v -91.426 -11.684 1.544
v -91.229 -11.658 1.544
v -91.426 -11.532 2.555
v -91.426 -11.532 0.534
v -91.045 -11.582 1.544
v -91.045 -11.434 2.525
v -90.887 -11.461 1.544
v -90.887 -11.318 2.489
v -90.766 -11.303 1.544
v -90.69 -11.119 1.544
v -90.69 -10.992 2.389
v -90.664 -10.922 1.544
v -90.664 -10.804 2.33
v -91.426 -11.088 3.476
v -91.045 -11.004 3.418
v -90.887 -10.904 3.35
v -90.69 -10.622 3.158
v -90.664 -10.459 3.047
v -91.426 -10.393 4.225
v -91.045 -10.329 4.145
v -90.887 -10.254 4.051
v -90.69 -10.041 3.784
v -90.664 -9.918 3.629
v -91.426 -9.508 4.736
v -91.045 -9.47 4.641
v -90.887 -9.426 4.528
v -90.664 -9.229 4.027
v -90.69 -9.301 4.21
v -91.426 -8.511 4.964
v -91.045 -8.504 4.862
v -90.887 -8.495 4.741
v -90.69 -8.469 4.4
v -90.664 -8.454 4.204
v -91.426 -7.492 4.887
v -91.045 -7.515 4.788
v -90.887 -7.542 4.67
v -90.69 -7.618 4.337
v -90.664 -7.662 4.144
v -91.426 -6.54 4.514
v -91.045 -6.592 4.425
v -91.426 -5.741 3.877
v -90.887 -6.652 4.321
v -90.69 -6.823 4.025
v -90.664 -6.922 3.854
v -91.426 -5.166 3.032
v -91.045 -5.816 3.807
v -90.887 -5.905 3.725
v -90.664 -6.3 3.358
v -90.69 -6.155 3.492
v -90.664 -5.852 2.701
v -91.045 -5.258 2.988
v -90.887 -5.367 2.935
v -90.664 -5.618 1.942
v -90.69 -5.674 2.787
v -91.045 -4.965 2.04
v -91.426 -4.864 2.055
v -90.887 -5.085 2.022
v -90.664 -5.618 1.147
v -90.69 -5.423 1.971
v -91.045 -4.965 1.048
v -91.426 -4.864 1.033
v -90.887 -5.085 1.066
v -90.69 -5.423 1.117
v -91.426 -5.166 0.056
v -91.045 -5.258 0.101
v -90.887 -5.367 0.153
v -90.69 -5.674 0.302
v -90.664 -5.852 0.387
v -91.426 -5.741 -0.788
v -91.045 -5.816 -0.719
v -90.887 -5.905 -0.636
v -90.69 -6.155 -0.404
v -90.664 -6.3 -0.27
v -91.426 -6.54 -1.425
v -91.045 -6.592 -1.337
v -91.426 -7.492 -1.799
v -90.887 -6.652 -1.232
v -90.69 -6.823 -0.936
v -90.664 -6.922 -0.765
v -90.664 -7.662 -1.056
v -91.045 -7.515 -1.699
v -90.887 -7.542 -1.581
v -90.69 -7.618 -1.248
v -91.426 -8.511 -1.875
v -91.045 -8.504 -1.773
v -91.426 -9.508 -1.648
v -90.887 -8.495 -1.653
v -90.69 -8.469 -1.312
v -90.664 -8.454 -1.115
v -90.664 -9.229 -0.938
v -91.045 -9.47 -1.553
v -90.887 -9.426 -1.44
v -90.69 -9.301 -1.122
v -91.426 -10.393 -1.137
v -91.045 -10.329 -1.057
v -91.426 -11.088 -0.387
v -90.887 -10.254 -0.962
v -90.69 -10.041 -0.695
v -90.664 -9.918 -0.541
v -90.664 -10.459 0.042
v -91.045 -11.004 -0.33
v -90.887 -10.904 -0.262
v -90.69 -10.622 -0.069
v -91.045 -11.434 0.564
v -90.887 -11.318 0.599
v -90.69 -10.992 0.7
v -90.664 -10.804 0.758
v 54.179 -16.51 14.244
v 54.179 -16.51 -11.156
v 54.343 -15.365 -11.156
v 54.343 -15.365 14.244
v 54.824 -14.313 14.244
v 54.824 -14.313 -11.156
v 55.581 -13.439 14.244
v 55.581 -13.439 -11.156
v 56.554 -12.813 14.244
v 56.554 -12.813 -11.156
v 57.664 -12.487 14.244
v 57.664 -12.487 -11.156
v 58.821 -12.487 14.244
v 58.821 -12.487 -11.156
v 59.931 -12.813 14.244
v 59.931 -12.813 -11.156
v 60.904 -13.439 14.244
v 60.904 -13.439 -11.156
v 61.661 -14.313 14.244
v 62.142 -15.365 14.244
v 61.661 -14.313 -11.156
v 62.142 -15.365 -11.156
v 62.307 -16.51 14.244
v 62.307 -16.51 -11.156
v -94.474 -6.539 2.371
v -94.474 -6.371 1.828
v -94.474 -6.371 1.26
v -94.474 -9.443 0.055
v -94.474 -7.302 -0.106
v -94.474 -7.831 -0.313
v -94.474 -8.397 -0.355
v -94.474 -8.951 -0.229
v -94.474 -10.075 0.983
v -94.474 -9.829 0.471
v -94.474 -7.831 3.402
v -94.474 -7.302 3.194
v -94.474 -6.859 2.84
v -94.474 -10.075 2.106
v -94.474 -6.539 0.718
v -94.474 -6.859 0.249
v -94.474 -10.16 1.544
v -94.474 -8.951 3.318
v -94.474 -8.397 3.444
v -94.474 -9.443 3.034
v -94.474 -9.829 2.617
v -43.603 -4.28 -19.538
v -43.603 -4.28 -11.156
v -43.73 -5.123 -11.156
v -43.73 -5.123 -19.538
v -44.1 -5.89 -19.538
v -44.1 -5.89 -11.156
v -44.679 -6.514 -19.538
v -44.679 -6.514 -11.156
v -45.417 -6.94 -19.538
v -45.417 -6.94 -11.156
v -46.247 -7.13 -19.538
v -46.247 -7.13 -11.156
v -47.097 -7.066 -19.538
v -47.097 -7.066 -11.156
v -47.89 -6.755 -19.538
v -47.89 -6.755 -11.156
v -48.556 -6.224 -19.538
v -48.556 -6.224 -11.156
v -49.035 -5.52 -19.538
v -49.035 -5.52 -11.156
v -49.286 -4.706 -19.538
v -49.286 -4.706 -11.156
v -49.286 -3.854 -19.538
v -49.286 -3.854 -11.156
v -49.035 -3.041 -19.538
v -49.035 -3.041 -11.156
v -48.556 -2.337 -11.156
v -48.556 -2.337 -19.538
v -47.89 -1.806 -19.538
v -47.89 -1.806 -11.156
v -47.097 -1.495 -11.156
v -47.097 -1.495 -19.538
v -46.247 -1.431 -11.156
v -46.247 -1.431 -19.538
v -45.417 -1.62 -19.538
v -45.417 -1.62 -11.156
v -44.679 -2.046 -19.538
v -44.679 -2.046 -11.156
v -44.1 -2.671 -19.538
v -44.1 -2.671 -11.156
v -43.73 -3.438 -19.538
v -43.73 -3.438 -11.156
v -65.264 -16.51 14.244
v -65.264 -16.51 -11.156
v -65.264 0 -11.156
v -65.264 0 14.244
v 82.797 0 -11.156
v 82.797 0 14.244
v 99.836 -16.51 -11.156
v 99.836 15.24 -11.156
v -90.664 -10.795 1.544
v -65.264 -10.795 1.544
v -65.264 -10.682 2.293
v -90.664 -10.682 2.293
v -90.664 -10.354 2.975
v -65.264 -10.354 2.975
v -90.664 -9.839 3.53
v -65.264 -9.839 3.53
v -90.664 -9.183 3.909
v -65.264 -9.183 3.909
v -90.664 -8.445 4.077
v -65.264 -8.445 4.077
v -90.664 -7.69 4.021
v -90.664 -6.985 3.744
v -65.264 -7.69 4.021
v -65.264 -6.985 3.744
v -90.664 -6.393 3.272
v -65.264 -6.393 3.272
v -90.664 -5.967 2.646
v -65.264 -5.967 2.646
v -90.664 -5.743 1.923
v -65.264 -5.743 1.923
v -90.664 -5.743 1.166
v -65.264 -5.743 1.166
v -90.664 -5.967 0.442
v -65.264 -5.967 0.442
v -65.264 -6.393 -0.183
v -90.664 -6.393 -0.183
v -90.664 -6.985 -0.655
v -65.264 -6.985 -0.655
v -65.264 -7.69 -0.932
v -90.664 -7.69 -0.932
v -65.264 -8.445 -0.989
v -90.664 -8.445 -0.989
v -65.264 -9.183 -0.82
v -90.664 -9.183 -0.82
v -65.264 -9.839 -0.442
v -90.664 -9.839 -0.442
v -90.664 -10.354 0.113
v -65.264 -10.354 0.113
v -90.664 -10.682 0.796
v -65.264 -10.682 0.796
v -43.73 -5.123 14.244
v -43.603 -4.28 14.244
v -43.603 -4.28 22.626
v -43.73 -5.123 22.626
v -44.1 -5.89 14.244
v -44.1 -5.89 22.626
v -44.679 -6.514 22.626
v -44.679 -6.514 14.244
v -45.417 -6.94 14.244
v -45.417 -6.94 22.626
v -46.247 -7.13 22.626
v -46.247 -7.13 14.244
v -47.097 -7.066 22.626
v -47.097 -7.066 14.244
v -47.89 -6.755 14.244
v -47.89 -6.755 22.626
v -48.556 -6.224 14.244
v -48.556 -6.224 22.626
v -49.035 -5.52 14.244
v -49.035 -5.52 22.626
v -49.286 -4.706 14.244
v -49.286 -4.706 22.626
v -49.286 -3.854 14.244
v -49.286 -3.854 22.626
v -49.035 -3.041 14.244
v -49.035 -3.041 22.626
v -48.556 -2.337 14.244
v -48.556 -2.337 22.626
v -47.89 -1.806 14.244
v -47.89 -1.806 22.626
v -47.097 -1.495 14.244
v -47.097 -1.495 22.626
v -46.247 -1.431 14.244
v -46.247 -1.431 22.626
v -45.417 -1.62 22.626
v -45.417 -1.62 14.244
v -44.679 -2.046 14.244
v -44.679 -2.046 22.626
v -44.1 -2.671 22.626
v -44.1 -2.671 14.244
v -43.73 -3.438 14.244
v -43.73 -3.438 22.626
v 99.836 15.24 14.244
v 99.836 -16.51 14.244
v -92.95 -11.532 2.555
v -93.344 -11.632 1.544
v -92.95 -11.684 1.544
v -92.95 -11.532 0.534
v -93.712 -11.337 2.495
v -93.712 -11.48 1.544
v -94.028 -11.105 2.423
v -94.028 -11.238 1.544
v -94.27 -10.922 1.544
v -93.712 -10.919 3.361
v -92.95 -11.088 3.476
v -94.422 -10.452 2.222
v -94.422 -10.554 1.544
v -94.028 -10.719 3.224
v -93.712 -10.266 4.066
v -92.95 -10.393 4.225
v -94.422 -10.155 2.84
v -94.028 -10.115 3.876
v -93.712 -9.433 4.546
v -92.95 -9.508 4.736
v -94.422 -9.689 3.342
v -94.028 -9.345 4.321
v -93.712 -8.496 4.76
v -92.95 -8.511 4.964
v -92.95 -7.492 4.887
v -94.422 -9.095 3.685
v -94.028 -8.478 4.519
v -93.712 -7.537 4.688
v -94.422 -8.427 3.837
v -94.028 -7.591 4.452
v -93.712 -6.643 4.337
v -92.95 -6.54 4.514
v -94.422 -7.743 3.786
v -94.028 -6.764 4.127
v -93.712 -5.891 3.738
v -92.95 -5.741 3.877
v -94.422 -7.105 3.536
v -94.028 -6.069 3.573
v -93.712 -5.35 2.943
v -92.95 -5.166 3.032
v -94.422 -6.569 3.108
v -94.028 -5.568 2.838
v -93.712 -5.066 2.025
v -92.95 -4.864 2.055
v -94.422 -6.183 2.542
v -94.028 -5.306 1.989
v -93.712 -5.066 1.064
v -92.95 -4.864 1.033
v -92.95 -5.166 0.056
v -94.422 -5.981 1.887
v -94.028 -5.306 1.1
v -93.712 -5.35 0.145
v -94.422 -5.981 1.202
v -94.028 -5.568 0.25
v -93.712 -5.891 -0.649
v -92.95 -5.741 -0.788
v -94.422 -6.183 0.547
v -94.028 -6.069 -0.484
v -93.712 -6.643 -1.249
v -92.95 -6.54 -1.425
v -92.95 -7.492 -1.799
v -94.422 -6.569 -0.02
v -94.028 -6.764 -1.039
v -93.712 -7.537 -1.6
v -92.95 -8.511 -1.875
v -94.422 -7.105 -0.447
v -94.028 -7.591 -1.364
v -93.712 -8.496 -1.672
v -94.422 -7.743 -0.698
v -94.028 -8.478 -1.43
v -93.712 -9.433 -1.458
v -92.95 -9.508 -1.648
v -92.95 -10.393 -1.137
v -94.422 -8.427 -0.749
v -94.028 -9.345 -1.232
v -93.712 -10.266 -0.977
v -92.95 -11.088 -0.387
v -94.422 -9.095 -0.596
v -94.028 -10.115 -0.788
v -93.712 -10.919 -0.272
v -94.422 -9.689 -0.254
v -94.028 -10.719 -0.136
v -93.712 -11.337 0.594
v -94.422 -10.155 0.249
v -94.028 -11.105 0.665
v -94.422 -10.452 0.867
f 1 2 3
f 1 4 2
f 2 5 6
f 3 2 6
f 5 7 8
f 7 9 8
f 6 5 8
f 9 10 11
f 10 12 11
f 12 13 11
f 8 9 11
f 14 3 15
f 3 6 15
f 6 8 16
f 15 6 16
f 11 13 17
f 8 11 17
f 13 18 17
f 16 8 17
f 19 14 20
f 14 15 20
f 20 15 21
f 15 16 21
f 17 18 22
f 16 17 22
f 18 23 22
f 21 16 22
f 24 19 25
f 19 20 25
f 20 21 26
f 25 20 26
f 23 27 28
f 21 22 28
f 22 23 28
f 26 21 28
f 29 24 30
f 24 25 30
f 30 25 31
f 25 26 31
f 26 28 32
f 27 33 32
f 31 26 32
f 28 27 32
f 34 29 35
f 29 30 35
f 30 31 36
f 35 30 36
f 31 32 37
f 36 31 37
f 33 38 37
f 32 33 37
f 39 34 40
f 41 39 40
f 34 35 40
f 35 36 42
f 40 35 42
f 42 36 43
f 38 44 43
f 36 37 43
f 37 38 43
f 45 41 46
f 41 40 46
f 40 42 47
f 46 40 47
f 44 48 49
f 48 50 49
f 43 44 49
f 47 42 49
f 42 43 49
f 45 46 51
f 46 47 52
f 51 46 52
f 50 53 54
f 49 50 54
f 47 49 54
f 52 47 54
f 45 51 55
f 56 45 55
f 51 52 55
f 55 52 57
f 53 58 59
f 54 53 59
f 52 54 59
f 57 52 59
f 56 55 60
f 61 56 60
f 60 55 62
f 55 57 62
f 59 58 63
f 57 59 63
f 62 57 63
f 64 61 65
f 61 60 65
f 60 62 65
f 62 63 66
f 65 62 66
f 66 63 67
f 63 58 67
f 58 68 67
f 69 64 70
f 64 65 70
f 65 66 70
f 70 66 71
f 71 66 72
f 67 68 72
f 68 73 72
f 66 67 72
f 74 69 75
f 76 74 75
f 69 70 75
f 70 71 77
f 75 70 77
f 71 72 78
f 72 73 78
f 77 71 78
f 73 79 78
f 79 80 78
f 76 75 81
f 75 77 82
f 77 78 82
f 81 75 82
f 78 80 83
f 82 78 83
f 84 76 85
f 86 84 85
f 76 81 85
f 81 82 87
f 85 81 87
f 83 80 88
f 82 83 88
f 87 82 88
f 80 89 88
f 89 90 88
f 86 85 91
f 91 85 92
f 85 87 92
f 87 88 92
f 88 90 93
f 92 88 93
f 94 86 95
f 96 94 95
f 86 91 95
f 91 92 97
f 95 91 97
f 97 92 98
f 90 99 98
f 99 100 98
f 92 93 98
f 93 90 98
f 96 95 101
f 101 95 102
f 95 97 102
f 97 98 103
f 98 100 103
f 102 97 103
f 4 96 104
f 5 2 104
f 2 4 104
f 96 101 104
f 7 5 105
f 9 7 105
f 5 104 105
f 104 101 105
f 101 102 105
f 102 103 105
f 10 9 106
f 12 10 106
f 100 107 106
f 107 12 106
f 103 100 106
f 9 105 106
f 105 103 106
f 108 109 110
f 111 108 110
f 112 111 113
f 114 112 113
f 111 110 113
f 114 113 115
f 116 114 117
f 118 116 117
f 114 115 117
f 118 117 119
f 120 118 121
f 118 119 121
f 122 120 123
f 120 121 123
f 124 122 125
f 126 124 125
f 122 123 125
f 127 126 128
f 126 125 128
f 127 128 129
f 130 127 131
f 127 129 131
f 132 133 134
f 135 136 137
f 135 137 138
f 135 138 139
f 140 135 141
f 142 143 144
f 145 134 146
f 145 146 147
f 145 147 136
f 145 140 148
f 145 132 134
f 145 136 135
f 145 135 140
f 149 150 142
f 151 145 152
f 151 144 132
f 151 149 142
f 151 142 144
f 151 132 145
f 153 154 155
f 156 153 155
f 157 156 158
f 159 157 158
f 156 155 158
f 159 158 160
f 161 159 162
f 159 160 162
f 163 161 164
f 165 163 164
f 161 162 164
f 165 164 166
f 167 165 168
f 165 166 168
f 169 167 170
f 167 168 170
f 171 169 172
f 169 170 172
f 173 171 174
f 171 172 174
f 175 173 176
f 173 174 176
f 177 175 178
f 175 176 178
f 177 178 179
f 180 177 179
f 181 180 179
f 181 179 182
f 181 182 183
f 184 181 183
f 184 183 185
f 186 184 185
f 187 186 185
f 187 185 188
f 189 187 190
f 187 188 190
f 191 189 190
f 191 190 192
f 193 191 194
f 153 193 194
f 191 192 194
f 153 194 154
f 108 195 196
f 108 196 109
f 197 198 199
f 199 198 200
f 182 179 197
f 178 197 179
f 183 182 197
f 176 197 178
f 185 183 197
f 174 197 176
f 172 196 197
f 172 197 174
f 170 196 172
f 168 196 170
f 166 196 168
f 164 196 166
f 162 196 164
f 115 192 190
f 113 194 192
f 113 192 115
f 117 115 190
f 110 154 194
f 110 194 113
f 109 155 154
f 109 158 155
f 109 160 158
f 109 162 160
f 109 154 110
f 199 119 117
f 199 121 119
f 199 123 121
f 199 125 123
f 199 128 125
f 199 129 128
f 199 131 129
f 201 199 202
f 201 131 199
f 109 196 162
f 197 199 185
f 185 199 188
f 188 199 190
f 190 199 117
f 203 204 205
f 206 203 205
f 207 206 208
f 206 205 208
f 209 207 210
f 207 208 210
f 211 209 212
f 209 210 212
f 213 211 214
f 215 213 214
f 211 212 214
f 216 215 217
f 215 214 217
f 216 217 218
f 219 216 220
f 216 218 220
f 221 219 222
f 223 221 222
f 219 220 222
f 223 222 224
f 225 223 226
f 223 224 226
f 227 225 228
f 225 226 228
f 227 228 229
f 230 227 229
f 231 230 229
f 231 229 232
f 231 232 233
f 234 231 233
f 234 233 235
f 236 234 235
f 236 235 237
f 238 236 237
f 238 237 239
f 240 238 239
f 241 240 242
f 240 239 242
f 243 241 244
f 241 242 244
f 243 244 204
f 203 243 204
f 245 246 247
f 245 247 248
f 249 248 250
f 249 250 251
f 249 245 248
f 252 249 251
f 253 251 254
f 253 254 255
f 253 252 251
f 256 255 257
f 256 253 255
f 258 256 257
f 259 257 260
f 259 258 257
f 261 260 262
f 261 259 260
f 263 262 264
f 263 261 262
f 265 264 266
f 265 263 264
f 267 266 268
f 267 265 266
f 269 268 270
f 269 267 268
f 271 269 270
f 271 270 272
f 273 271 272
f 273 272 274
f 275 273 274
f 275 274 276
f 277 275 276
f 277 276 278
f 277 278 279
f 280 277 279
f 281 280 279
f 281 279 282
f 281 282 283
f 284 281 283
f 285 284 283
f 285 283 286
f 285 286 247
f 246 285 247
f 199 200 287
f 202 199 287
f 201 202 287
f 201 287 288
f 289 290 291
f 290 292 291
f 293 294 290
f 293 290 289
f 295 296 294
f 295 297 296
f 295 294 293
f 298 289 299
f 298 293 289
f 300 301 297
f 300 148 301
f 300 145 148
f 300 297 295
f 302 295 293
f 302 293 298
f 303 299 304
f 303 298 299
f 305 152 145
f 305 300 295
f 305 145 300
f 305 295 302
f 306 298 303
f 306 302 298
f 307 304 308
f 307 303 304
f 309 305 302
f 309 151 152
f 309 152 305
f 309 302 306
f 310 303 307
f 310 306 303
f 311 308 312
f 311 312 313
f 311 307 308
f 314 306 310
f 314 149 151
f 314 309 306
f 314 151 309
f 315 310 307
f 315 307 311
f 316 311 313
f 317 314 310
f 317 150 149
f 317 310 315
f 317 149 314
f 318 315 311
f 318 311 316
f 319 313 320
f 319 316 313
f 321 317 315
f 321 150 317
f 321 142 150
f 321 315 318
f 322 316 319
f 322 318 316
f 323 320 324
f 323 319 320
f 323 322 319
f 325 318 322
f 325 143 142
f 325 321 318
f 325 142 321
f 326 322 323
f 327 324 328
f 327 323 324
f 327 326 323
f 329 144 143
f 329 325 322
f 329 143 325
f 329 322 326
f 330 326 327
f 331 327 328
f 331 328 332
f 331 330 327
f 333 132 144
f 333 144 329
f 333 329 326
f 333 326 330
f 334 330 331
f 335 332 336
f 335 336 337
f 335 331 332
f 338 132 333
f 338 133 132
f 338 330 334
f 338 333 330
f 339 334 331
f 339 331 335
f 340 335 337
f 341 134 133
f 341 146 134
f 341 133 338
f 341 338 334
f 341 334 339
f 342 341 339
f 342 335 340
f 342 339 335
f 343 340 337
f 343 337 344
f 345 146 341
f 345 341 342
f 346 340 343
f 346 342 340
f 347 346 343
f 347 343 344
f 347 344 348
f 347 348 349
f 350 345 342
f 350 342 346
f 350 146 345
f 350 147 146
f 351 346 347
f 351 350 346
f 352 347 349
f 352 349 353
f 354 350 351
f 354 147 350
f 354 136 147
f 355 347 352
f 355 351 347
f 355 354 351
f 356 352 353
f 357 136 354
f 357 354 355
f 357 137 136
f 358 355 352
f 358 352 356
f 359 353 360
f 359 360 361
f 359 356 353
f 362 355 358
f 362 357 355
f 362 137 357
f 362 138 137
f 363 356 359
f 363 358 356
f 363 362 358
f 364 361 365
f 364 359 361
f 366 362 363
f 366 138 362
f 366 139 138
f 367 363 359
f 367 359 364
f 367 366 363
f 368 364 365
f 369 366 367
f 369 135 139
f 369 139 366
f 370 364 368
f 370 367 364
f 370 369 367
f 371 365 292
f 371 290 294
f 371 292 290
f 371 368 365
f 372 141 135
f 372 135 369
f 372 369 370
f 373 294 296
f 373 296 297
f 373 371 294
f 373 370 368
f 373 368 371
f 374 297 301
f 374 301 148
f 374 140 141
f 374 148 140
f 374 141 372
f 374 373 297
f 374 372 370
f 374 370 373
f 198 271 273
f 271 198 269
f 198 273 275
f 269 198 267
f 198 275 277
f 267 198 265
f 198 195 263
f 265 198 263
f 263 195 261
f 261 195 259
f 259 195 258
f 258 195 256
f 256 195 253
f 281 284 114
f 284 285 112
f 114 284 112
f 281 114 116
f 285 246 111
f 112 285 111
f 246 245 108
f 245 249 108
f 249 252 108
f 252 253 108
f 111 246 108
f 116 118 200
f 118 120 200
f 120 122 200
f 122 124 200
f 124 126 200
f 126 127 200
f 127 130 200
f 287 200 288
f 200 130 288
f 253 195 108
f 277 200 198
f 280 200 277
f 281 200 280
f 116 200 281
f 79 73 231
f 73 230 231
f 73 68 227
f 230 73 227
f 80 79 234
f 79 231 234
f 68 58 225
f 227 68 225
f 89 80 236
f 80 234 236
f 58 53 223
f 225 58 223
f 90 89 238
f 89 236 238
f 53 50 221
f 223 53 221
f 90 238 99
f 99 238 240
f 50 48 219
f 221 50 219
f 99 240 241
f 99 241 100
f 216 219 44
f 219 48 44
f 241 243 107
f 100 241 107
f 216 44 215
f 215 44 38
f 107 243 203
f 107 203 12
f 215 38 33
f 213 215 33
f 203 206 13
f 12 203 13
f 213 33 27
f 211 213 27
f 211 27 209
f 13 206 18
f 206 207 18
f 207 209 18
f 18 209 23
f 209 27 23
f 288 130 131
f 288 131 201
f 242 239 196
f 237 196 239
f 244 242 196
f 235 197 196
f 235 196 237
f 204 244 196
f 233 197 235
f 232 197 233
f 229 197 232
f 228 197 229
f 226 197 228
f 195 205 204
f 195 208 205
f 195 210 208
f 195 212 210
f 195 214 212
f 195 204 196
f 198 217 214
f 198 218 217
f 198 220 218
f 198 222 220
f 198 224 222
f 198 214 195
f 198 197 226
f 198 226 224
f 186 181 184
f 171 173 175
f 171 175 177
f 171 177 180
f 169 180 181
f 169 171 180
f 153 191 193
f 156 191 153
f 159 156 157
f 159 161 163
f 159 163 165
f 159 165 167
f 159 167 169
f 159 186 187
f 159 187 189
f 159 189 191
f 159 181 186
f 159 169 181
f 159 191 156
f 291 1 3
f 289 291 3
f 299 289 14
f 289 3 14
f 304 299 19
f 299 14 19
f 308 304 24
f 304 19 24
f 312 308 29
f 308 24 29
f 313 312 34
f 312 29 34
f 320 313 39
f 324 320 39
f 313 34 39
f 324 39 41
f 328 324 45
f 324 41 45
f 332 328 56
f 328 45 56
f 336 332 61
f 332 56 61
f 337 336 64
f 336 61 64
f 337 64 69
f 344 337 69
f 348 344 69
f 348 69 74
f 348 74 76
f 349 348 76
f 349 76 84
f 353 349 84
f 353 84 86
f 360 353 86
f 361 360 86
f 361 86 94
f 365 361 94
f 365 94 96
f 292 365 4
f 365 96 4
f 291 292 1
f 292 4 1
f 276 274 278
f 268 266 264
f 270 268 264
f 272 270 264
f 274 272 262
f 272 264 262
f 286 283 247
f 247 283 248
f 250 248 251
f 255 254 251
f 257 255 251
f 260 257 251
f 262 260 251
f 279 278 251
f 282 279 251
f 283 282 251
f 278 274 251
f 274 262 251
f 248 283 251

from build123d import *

# Parameters (mm, degrees)
F0_W          = 165.1
F0_H          = 25.4
F1_DEPTH      = 16.51
F3_R          = 2.8575
F4_DEPTH      = 8.382
F4_DEPTH_BACK = 33.782
F5_DEPTH      = 25.4
F6_DEPTH      = 25.4
F7_R          = 4.064
F8_DEPTH      = 25.4
F9_R          = 2.54
F10_DEPTH     = 25.4
F11_R         = 3.429
F12_DEPTH     = 3.81
F13_R         = 1.524
F14_R         = 0.762


# Not quite as in the source:
# - a feature names something its author has since deleted; it is built from what else it names


with BuildPart() as f1:
    # F0 (on Front) → F1 (new body)
    with BuildSketch(Plane.XZ):
        with Locations((17.2861106694, 1.5442719363)):
            Rectangle(F0_W, F0_H)
    extrude(amount=F1_DEPTH)

    # F3 (on face) → F4 (join, two sides)
    with BuildSketch(Plane(origin=(0, 0, -11.1557280637), x_dir=(1, 0, 0), z_dir=(0, 0, -1))) as f4_sk:
        with Locations((-46.4608334005, 4.2803706601)):
            Circle(F3_R)
    extrude(amount=F4_DEPTH)
    extrude(f4_sk.sketch, amount=-F4_DEPTH_BACK)

    # F2 (on face) → F5 (join)
    with BuildSketch(Plane(origin=(0, 0, -11.1557280637), x_dir=(1, 0, 0), z_dir=(0, 0, -1))):
        Polygon((99.8361106694, 0), (82.7972726808, 0), (99.8361106694, -15.24), align=None)
    extrude(amount=-F5_DEPTH)

    # F2 (on face) → F6 (join)
    with BuildSketch(Plane(origin=(0, 0, -11.1557280637), x_dir=(1, 0, 0), z_dir=(0, 0, -1))):
        Polygon((99.8361106694, 0), (82.7972726808, 0), (99.8361106694, -15.24), align=None)
    extrude(amount=-F6_DEPTH)

    # F7 (on face) → F8 (cut)
    with BuildSketch(Plane(origin=(0, 0, -11.1557280637), x_dir=(1, 0, 0), z_dir=(0, 0, -1))):
        with Locations((58.2425315266, 16.51)):
            Circle(F7_R)
    extrude(amount=-F8_DEPTH, mode=Mode.SUBTRACT)

    # F9 (on face) → F10 (join)
    with BuildSketch(Plane(origin=(-65.2638893306, 0, 0), x_dir=(0, -1, 0), z_dir=(-1, 0, 0))):
        with Locations((8.255, 1.5442719363)):
            Circle(F9_R)
    extrude(amount=F10_DEPTH)

    # F11 (on face) → F12 (join)
    with BuildSketch(Plane(origin=(-90.6638893306, 0, 0), x_dir=(0, -1, 0), z_dir=(-1, 0, 0))):
        with Locations((8.255, 1.5442719363)):
            Circle(F11_R)
    extrude(amount=F12_DEPTH)

    # F13
    f13_edges = [f1.edges().sort_by_distance(p)[0] for p in [
        (-94.473889, -4.826, 1.544272),
    ]]
    fillet(f13_edges, radius=F13_R)

    # F14
    f14_edges = [f1.edges().sort_by_distance(p)[0] for p in [
        (-90.663889, -4.826, 1.544272),
    ]]
    fillet(f14_edges, radius=F14_R)


solid = f1.part
